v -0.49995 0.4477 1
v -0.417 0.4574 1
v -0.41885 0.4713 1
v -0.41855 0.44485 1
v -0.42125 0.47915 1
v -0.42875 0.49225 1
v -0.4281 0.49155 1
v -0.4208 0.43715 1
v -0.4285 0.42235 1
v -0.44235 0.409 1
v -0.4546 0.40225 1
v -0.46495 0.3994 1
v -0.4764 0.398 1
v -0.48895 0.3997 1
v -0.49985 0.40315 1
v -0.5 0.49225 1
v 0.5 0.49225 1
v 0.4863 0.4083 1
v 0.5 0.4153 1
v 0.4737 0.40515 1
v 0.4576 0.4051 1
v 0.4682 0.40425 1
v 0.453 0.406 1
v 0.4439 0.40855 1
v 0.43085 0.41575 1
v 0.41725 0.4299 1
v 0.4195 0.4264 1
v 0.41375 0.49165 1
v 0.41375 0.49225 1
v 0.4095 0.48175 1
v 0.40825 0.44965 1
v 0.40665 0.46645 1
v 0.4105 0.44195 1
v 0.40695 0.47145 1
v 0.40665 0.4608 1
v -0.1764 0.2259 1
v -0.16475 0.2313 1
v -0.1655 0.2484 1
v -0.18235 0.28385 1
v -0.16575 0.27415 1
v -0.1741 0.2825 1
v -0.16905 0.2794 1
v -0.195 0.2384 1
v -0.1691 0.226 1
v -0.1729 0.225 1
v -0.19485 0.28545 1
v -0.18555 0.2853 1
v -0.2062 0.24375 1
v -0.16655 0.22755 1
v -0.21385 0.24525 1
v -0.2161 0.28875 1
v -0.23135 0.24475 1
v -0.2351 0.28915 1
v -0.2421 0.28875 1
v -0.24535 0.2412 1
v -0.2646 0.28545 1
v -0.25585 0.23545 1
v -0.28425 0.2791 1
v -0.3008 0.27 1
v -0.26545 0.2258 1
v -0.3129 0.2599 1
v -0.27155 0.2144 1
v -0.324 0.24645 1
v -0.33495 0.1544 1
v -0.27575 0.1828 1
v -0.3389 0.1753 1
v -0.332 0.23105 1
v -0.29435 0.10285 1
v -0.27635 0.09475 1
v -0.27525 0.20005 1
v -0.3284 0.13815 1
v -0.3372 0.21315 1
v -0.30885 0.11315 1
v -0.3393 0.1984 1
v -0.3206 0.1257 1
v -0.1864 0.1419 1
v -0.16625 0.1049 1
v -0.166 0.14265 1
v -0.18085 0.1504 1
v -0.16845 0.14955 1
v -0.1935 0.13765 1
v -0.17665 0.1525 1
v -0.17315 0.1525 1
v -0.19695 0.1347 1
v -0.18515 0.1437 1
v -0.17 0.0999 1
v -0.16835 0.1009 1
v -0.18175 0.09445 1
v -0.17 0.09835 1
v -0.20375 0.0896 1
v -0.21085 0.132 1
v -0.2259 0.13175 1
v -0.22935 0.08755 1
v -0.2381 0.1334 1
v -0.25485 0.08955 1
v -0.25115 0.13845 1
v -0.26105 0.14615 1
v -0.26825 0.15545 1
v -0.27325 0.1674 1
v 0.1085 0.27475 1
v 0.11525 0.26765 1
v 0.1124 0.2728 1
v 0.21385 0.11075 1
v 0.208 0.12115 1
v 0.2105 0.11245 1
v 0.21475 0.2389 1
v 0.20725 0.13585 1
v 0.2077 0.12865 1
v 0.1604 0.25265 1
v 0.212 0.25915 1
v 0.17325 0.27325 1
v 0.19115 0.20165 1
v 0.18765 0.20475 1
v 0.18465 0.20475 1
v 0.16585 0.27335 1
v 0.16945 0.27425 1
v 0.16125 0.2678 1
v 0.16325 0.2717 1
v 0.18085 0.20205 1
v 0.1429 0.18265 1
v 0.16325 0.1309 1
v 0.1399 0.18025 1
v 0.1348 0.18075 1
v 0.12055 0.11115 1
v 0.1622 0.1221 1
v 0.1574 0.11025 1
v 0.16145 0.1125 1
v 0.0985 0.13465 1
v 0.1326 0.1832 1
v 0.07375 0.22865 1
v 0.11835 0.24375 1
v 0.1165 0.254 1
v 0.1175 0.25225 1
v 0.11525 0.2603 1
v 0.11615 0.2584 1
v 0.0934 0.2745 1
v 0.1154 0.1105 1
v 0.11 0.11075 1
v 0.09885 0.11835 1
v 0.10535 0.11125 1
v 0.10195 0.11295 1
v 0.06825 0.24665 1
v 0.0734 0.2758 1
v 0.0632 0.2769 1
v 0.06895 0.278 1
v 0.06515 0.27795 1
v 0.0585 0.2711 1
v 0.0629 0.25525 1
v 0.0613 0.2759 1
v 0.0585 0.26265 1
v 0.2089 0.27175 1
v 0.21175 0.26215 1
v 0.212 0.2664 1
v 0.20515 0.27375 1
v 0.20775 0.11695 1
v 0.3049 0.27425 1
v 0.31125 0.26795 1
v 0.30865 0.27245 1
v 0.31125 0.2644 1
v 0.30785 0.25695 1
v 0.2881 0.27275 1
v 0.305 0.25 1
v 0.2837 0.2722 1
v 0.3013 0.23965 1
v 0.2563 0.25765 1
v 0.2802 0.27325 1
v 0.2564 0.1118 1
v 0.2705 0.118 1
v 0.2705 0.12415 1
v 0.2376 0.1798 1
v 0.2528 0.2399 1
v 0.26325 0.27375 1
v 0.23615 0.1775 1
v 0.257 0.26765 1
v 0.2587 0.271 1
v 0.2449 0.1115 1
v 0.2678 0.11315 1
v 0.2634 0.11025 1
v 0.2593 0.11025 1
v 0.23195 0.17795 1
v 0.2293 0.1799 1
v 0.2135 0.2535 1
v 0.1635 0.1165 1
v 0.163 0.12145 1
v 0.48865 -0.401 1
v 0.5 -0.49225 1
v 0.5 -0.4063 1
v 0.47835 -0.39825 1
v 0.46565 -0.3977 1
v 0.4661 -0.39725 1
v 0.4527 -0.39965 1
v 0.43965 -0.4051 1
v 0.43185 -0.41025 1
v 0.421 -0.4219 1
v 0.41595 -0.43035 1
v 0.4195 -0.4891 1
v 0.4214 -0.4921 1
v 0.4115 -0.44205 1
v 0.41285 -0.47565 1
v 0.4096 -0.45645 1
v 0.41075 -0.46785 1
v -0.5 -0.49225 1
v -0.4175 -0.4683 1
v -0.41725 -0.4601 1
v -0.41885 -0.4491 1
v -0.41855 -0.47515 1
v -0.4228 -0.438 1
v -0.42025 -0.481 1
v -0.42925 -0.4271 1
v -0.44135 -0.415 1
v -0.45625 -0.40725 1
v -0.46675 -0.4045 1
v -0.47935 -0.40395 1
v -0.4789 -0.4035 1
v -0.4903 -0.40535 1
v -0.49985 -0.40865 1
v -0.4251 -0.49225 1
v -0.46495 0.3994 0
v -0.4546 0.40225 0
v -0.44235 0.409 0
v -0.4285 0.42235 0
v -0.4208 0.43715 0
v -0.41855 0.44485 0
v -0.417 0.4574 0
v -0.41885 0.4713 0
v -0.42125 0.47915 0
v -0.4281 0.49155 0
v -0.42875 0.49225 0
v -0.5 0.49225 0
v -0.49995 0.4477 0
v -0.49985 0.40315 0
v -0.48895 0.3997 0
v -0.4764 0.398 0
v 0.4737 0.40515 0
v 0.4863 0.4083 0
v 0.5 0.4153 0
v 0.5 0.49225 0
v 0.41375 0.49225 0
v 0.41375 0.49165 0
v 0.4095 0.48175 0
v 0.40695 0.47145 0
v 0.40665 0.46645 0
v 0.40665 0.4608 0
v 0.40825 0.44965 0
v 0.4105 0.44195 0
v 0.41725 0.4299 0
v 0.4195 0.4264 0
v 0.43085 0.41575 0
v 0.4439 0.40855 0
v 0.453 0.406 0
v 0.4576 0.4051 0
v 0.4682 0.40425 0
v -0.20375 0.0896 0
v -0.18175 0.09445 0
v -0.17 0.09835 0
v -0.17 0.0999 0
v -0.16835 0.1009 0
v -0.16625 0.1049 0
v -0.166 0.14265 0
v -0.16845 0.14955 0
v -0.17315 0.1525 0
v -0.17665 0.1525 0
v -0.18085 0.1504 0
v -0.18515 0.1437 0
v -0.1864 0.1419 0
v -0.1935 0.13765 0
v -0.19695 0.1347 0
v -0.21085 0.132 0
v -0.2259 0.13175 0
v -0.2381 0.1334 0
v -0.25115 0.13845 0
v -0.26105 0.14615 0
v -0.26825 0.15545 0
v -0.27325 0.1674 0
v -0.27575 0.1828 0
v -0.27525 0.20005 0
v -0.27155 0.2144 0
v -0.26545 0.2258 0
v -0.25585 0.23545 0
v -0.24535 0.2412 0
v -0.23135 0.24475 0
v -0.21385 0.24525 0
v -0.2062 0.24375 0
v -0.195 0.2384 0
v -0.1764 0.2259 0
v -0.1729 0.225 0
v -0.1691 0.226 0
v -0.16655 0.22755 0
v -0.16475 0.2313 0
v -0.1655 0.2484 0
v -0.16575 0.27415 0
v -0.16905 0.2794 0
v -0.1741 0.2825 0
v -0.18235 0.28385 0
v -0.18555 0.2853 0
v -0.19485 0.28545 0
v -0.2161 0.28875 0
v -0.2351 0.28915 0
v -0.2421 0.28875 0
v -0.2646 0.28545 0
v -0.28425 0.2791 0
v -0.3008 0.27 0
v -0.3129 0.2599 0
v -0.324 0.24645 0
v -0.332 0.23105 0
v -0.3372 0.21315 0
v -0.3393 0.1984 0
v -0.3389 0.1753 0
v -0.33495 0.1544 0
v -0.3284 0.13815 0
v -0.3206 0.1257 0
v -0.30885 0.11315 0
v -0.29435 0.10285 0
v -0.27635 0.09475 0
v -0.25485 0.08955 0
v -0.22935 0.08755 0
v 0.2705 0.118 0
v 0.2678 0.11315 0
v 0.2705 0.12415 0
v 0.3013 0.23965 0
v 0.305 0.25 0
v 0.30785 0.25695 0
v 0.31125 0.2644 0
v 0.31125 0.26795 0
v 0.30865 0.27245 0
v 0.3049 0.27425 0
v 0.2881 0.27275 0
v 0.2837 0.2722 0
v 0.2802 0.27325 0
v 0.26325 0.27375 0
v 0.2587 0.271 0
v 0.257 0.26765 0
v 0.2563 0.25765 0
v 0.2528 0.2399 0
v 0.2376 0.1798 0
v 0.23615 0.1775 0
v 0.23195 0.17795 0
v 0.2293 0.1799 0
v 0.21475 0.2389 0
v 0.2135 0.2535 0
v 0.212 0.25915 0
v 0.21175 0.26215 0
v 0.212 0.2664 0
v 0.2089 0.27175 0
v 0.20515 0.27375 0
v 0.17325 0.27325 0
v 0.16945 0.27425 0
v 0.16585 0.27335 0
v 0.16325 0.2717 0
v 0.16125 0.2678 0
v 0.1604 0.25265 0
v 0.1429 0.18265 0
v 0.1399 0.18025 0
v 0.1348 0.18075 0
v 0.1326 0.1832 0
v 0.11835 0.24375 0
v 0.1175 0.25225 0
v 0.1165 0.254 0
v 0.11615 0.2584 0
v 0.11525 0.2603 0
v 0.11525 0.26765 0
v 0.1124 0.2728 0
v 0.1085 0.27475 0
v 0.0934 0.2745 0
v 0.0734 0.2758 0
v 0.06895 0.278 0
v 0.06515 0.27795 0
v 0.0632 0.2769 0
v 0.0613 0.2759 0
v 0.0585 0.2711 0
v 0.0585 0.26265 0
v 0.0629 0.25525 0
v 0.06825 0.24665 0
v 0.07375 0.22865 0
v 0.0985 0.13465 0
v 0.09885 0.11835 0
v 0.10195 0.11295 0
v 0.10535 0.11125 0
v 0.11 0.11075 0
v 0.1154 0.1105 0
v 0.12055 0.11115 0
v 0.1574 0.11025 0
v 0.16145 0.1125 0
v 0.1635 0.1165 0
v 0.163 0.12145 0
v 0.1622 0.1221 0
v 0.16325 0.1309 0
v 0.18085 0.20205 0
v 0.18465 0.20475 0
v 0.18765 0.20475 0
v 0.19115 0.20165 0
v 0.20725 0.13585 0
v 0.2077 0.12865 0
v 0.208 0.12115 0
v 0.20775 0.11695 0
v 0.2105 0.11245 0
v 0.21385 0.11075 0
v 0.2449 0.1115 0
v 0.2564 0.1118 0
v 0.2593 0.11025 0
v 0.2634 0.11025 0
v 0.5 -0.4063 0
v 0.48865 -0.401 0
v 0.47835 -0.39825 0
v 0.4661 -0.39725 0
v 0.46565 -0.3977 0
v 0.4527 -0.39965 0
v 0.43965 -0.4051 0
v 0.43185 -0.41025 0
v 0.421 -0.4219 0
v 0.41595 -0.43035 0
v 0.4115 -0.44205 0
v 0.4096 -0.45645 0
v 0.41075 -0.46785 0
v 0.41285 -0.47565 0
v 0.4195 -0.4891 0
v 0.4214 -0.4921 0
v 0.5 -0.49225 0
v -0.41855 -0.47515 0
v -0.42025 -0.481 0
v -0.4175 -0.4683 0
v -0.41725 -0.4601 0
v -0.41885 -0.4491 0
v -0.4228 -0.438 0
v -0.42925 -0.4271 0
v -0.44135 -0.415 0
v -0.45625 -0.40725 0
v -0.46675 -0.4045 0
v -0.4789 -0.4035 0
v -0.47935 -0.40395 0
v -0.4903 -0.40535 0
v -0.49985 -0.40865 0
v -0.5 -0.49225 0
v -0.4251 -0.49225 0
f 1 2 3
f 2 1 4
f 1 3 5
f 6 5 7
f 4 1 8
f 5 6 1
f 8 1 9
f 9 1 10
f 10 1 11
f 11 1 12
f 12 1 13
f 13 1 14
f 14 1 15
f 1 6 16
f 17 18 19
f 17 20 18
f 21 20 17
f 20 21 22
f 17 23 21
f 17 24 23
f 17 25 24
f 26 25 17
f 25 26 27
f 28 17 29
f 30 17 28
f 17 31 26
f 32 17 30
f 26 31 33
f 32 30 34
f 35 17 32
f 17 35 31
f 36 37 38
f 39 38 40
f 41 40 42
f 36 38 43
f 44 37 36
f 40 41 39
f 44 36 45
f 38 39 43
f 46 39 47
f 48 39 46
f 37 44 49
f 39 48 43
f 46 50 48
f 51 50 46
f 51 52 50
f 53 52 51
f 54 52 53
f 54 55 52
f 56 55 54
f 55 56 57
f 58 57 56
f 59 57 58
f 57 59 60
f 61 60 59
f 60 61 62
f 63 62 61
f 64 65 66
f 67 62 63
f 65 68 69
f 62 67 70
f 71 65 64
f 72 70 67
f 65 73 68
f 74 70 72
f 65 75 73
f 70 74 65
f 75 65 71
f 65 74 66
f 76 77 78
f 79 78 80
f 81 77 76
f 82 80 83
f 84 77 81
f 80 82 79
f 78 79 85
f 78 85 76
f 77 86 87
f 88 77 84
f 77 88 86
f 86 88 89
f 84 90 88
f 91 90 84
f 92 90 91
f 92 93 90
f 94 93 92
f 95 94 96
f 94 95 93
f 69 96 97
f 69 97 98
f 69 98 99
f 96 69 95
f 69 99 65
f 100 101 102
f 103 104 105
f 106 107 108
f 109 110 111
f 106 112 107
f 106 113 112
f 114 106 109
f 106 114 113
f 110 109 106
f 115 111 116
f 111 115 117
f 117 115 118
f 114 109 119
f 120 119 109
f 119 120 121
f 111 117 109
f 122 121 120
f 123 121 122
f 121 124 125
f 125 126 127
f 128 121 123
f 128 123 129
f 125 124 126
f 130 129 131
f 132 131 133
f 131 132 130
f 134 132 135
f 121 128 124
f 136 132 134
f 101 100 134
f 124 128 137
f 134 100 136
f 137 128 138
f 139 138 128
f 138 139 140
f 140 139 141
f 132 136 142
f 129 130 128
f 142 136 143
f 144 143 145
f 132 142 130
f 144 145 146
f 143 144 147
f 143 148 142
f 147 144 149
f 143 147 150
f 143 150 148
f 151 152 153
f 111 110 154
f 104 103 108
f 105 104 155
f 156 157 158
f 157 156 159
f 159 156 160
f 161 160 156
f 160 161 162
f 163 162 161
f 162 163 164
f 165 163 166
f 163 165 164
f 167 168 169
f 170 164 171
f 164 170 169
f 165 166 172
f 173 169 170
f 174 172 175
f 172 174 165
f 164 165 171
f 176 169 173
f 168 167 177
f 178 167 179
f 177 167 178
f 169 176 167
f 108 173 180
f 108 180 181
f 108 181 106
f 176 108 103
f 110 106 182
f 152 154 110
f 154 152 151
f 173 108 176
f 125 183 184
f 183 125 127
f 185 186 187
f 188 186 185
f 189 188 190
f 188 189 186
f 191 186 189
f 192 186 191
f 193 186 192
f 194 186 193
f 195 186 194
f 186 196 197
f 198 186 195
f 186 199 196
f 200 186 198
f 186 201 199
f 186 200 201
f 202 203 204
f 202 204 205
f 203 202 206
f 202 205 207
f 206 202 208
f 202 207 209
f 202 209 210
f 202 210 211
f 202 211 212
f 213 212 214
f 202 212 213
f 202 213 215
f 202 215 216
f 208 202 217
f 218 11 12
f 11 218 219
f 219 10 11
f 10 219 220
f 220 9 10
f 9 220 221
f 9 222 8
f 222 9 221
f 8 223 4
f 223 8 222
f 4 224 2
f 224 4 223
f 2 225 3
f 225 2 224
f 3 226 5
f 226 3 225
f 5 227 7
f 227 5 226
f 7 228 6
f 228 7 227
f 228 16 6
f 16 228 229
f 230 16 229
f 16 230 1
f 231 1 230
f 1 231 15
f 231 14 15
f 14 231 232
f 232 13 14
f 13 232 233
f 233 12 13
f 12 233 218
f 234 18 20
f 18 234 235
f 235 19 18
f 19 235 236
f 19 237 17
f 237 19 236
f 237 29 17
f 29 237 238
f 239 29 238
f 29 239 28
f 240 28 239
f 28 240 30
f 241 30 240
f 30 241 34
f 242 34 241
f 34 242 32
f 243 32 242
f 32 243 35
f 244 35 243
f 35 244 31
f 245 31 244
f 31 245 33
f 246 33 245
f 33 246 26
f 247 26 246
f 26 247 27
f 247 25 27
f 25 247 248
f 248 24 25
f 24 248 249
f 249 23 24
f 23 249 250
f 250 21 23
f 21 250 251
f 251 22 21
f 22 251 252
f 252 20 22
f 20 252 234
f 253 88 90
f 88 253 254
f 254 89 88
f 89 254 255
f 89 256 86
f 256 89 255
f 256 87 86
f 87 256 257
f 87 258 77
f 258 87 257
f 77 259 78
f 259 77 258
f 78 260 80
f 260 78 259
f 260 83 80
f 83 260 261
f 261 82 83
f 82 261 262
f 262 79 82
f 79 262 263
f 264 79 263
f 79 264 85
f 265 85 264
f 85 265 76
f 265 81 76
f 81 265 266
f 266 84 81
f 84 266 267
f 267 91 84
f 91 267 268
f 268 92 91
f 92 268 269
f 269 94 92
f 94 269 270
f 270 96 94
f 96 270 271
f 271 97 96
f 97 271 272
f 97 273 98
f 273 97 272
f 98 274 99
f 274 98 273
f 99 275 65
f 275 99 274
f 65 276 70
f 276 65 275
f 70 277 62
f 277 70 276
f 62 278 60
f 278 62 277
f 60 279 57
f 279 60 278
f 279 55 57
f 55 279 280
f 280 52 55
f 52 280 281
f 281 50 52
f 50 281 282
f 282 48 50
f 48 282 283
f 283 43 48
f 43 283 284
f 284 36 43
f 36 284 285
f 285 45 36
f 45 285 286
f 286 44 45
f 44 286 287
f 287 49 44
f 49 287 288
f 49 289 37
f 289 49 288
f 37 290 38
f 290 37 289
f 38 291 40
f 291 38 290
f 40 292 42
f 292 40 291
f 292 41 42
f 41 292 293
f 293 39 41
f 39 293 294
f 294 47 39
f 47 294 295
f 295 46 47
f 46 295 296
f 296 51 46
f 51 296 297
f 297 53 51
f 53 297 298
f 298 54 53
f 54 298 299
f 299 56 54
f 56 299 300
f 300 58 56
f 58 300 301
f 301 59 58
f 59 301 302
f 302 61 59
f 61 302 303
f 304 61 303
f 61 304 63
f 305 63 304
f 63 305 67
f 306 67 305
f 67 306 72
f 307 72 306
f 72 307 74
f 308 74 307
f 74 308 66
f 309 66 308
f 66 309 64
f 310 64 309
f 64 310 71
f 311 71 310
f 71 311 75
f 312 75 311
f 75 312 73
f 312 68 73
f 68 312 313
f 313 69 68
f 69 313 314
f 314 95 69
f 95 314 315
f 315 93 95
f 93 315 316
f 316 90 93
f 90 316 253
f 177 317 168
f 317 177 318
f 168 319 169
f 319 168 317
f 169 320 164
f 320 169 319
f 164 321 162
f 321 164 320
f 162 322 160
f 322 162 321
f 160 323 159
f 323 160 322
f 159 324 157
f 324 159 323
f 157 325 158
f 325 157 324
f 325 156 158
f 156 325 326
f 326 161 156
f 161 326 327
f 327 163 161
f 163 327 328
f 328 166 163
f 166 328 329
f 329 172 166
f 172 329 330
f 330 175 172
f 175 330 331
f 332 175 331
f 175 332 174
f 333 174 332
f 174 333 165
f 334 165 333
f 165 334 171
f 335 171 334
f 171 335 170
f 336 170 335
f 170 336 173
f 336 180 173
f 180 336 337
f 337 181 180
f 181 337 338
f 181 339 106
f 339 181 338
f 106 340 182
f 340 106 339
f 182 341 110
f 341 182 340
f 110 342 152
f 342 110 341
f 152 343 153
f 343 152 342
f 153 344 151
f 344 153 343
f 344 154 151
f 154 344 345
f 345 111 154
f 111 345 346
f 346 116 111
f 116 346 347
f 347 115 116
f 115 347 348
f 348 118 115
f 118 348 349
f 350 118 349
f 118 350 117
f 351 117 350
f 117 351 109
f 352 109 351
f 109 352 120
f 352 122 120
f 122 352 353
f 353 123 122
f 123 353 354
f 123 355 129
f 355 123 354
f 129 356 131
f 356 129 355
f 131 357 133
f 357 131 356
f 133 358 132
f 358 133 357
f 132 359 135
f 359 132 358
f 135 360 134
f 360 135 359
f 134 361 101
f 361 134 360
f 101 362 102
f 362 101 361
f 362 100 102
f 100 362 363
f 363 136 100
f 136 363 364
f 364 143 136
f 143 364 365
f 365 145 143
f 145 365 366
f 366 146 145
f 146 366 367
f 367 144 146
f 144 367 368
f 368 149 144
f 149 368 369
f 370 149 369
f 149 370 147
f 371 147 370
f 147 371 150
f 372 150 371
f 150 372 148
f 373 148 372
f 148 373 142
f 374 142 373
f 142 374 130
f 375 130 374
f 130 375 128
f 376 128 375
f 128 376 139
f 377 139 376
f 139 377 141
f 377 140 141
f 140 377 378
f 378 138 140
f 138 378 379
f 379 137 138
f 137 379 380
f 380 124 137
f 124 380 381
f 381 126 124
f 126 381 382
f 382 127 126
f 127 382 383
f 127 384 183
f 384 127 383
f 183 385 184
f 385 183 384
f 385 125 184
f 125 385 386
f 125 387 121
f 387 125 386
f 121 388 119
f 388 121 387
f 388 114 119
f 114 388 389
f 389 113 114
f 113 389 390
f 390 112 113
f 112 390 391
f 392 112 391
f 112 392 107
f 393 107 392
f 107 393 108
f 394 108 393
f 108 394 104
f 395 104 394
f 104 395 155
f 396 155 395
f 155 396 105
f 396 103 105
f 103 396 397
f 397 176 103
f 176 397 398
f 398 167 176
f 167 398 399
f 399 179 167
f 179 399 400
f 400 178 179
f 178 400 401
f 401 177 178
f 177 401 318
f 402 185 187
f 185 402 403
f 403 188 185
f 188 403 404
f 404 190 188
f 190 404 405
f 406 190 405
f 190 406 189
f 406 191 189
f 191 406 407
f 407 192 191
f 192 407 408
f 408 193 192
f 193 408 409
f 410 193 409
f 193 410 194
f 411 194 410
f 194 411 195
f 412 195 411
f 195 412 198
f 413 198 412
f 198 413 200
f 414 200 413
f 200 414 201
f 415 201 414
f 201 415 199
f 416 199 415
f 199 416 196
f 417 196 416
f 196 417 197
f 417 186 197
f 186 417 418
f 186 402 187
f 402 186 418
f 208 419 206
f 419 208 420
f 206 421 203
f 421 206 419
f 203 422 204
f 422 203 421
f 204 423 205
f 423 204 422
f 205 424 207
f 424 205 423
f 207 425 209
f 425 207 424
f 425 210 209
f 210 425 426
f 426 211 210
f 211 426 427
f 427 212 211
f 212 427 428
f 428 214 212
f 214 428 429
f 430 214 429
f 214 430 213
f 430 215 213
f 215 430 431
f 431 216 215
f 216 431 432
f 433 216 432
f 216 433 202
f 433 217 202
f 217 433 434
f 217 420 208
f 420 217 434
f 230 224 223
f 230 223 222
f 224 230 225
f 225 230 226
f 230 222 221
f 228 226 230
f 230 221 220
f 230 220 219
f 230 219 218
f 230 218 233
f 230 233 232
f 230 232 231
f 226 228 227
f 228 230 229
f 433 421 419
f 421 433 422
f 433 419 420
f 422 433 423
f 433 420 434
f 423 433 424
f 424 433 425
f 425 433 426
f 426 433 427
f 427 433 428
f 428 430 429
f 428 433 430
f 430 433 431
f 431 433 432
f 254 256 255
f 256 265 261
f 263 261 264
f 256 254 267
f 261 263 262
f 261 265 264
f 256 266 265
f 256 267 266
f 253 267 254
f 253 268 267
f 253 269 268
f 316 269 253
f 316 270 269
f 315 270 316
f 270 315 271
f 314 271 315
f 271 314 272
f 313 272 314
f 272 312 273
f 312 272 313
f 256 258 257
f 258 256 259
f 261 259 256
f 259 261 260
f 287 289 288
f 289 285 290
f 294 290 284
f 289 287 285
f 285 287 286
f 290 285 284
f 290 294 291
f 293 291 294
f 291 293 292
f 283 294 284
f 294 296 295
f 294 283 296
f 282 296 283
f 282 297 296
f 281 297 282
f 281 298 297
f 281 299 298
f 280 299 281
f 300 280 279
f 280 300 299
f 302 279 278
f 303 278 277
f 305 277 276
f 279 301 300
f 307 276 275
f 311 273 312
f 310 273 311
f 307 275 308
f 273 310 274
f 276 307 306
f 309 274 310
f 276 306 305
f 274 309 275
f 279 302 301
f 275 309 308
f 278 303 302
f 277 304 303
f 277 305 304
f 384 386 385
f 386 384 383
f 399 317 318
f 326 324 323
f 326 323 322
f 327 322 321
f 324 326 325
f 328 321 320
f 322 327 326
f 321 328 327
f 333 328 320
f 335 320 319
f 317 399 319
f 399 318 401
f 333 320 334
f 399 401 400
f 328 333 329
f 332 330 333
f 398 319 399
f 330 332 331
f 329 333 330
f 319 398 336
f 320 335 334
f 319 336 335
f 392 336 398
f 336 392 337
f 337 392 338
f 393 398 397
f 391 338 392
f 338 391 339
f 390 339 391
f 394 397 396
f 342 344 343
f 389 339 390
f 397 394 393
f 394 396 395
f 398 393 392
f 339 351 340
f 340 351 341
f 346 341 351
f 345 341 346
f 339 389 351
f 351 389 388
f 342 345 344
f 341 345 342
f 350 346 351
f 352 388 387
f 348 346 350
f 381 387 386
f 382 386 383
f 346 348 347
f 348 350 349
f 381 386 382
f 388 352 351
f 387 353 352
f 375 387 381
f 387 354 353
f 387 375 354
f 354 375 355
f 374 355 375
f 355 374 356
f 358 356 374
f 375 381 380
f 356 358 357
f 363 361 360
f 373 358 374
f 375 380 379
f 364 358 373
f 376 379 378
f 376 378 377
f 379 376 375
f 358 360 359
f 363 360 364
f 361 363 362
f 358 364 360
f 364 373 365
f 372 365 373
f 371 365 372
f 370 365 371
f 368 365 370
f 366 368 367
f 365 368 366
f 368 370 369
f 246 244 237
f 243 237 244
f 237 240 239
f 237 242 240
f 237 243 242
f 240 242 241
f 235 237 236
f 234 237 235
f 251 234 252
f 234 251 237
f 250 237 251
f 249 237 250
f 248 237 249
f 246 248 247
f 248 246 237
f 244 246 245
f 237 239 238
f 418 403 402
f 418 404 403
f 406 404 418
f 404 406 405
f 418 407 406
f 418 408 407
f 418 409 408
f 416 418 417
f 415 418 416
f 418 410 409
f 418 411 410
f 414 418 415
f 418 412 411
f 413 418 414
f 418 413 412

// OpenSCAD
module CrickCoin3text_1()
{
 /* Generated by trace2scad version 20150415
    http://aggregate.org/MAKE/TRACE2SCAD/
    Optimized model has 221/1642 original points
 */
 color([0.5, 0.5, 0.5])
 assign(minx=0) /* polygon minx=0 */
 assign(miny=0) /* polygon miny=0 */
 assign(maxx=20000) /* polygon maxx=20000 */
 assign(maxy=19690) /* polygon maxy=19690 */
 assign(dx=maxx-minx)
 assign(dy=maxy-miny)
 assign(maxd=((dx>dy)?dx:dy))
 scale([1/maxd, 1/maxd, 1])
 translate([-minx-dx/2, -miny-dy/2, 0])
 linear_extrude(height=1, convexity=221)
 union() {
  union() {
   polygon([[1,18799],[3,17908],[221,17839],[472,17805],[701,17833],[908,17890],[1153,18025],[1430,18292],[1584,18588],[1629,18742],[1660,18993],[1623,19271],[1575,19428],[1438,19676],[1425,19690],[0,19690]], convexity=5);
   polygon([[18275,19684],[18275,19678],[18190,19480],[18139,19274],[18133,19174],[18133,19061],[18165,18838],[18210,18684],[18345,18443],[18390,18373],[18617,18160],[18878,18016],[19060,17965],[19152,17947],[19364,17930],[19474,17948],[19726,18011],[20000,18151],[20000,19690],[18275,19690]], convexity=7);
   polygon([[5228,15624],[5158,15620],[4708,15554],[4315,15427],[3984,15245],[3742,15043],[3520,14774],[3360,14466],[3256,14108],[3214,13813],[3222,13351],[3301,12933],[3432,12608],[3588,12359],[3823,12108],[4113,11902],[4473,11740],[4903,11636],[5413,11596],[5925,11637],[6365,11734],[6600,11812],[6600,11843],[6633,11863],[6675,11943],[6680,12698],[6631,12836],[6537,12895],[6467,12895],[6383,12853],[6297,12719],[6272,12683],[6130,12598],[6061,12539],[5783,12485],[5482,12480],[5238,12513],[4977,12614],[4779,12768],[4635,12954],[4535,13193],[4485,13501],[4495,13846],[4569,14133],[4691,14361],[4883,14554],[5093,14669],[5373,14740],[5723,14750],[5876,14720],[6100,14613],[6472,14363],[6542,14345],[6618,14365],[6669,14396],[6705,14471],[6690,14813],[6685,15328],[6619,15433],[6518,15495],[6353,15522],[6289,15551],[6103,15554],[5678,15620],[5298,15628]], convexity=12);
   polygon([[11264,15383],[11226,15363],[11170,15267],[11170,15098],[11258,14950],[11365,14778],[11475,14418],[11970,12538],[11977,12212],[12039,12104],[12107,12070],[12200,12060],[12308,12055],[12411,12068],[13148,12050],[13229,12095],[13270,12175],[13260,12274],[13244,12287],[13265,12463],[13617,13886],[13693,13940],[13753,13940],[13823,13878],[14145,12562],[14154,12418],[14160,12268],[14155,12184],[14210,12094],[14277,12060],[14898,12075],[15128,12081],[15186,12050],[15268,12050],[15356,12108],[15410,12205],[15410,12328],[16026,14638],[16100,14845],[16157,14984],[16225,15133],[16225,15204],[16173,15294],[16098,15330],[15762,15300],[15674,15289],[15604,15310],[15265,15320],[15174,15265],[15140,15198],[15126,14998],[15056,14643],[14752,13441],[14723,13395],[14639,13404],[14586,13443],[14295,14623],[14270,14915],[14240,15028],[14235,15088],[14240,15173],[14178,15280],[14103,15320],[13465,15310],[13389,15330],[13317,15312],[13265,15279],[13225,15201],[13208,14898],[12858,13498],[12798,13450],[12696,13460],[12652,13509],[12367,14720],[12350,14890],[12330,14925],[12323,15013],[12305,15051],[12305,15198],[12248,15301],[12170,15340],[11868,15335],[11468,15361],[11379,15405],[11303,15404]], convexity=31);
   polygon([[19317,1895],[19313,1891],[19054,1852],[18793,1743],[18637,1640],[18420,1407],[18319,1238],[18230,1004],[18192,716],[18215,488],[18257,332],[18390,63],[18428,3],[20000,0],[20000,1719],[19773,1825],[19567,1880],[19322,1900]], convexity=6);
   polygon([[417,1770],[413,1766],[194,1738],[3,1672],[0,0],[1498,0],[1595,225],[1629,342],[1650,479],[1655,643],[1623,863],[1544,1085],[1415,1303],[1173,1545],[875,1700],[665,1755],[422,1775]], convexity=5);
  }
 }
}

module CrickCoin3text()
{
 /* all layers combined, scaled to within a 1mm cube */
 scale([1, 1, 1/1])
 difference() {
  union() {
   scale([1,1,2]) translate([0,0,-0.5]) CrickCoin3text_1();
  }
  translate([0,0,-2]) cube([2,2,4],center=true);
 }
}
CrickCoin3text();
